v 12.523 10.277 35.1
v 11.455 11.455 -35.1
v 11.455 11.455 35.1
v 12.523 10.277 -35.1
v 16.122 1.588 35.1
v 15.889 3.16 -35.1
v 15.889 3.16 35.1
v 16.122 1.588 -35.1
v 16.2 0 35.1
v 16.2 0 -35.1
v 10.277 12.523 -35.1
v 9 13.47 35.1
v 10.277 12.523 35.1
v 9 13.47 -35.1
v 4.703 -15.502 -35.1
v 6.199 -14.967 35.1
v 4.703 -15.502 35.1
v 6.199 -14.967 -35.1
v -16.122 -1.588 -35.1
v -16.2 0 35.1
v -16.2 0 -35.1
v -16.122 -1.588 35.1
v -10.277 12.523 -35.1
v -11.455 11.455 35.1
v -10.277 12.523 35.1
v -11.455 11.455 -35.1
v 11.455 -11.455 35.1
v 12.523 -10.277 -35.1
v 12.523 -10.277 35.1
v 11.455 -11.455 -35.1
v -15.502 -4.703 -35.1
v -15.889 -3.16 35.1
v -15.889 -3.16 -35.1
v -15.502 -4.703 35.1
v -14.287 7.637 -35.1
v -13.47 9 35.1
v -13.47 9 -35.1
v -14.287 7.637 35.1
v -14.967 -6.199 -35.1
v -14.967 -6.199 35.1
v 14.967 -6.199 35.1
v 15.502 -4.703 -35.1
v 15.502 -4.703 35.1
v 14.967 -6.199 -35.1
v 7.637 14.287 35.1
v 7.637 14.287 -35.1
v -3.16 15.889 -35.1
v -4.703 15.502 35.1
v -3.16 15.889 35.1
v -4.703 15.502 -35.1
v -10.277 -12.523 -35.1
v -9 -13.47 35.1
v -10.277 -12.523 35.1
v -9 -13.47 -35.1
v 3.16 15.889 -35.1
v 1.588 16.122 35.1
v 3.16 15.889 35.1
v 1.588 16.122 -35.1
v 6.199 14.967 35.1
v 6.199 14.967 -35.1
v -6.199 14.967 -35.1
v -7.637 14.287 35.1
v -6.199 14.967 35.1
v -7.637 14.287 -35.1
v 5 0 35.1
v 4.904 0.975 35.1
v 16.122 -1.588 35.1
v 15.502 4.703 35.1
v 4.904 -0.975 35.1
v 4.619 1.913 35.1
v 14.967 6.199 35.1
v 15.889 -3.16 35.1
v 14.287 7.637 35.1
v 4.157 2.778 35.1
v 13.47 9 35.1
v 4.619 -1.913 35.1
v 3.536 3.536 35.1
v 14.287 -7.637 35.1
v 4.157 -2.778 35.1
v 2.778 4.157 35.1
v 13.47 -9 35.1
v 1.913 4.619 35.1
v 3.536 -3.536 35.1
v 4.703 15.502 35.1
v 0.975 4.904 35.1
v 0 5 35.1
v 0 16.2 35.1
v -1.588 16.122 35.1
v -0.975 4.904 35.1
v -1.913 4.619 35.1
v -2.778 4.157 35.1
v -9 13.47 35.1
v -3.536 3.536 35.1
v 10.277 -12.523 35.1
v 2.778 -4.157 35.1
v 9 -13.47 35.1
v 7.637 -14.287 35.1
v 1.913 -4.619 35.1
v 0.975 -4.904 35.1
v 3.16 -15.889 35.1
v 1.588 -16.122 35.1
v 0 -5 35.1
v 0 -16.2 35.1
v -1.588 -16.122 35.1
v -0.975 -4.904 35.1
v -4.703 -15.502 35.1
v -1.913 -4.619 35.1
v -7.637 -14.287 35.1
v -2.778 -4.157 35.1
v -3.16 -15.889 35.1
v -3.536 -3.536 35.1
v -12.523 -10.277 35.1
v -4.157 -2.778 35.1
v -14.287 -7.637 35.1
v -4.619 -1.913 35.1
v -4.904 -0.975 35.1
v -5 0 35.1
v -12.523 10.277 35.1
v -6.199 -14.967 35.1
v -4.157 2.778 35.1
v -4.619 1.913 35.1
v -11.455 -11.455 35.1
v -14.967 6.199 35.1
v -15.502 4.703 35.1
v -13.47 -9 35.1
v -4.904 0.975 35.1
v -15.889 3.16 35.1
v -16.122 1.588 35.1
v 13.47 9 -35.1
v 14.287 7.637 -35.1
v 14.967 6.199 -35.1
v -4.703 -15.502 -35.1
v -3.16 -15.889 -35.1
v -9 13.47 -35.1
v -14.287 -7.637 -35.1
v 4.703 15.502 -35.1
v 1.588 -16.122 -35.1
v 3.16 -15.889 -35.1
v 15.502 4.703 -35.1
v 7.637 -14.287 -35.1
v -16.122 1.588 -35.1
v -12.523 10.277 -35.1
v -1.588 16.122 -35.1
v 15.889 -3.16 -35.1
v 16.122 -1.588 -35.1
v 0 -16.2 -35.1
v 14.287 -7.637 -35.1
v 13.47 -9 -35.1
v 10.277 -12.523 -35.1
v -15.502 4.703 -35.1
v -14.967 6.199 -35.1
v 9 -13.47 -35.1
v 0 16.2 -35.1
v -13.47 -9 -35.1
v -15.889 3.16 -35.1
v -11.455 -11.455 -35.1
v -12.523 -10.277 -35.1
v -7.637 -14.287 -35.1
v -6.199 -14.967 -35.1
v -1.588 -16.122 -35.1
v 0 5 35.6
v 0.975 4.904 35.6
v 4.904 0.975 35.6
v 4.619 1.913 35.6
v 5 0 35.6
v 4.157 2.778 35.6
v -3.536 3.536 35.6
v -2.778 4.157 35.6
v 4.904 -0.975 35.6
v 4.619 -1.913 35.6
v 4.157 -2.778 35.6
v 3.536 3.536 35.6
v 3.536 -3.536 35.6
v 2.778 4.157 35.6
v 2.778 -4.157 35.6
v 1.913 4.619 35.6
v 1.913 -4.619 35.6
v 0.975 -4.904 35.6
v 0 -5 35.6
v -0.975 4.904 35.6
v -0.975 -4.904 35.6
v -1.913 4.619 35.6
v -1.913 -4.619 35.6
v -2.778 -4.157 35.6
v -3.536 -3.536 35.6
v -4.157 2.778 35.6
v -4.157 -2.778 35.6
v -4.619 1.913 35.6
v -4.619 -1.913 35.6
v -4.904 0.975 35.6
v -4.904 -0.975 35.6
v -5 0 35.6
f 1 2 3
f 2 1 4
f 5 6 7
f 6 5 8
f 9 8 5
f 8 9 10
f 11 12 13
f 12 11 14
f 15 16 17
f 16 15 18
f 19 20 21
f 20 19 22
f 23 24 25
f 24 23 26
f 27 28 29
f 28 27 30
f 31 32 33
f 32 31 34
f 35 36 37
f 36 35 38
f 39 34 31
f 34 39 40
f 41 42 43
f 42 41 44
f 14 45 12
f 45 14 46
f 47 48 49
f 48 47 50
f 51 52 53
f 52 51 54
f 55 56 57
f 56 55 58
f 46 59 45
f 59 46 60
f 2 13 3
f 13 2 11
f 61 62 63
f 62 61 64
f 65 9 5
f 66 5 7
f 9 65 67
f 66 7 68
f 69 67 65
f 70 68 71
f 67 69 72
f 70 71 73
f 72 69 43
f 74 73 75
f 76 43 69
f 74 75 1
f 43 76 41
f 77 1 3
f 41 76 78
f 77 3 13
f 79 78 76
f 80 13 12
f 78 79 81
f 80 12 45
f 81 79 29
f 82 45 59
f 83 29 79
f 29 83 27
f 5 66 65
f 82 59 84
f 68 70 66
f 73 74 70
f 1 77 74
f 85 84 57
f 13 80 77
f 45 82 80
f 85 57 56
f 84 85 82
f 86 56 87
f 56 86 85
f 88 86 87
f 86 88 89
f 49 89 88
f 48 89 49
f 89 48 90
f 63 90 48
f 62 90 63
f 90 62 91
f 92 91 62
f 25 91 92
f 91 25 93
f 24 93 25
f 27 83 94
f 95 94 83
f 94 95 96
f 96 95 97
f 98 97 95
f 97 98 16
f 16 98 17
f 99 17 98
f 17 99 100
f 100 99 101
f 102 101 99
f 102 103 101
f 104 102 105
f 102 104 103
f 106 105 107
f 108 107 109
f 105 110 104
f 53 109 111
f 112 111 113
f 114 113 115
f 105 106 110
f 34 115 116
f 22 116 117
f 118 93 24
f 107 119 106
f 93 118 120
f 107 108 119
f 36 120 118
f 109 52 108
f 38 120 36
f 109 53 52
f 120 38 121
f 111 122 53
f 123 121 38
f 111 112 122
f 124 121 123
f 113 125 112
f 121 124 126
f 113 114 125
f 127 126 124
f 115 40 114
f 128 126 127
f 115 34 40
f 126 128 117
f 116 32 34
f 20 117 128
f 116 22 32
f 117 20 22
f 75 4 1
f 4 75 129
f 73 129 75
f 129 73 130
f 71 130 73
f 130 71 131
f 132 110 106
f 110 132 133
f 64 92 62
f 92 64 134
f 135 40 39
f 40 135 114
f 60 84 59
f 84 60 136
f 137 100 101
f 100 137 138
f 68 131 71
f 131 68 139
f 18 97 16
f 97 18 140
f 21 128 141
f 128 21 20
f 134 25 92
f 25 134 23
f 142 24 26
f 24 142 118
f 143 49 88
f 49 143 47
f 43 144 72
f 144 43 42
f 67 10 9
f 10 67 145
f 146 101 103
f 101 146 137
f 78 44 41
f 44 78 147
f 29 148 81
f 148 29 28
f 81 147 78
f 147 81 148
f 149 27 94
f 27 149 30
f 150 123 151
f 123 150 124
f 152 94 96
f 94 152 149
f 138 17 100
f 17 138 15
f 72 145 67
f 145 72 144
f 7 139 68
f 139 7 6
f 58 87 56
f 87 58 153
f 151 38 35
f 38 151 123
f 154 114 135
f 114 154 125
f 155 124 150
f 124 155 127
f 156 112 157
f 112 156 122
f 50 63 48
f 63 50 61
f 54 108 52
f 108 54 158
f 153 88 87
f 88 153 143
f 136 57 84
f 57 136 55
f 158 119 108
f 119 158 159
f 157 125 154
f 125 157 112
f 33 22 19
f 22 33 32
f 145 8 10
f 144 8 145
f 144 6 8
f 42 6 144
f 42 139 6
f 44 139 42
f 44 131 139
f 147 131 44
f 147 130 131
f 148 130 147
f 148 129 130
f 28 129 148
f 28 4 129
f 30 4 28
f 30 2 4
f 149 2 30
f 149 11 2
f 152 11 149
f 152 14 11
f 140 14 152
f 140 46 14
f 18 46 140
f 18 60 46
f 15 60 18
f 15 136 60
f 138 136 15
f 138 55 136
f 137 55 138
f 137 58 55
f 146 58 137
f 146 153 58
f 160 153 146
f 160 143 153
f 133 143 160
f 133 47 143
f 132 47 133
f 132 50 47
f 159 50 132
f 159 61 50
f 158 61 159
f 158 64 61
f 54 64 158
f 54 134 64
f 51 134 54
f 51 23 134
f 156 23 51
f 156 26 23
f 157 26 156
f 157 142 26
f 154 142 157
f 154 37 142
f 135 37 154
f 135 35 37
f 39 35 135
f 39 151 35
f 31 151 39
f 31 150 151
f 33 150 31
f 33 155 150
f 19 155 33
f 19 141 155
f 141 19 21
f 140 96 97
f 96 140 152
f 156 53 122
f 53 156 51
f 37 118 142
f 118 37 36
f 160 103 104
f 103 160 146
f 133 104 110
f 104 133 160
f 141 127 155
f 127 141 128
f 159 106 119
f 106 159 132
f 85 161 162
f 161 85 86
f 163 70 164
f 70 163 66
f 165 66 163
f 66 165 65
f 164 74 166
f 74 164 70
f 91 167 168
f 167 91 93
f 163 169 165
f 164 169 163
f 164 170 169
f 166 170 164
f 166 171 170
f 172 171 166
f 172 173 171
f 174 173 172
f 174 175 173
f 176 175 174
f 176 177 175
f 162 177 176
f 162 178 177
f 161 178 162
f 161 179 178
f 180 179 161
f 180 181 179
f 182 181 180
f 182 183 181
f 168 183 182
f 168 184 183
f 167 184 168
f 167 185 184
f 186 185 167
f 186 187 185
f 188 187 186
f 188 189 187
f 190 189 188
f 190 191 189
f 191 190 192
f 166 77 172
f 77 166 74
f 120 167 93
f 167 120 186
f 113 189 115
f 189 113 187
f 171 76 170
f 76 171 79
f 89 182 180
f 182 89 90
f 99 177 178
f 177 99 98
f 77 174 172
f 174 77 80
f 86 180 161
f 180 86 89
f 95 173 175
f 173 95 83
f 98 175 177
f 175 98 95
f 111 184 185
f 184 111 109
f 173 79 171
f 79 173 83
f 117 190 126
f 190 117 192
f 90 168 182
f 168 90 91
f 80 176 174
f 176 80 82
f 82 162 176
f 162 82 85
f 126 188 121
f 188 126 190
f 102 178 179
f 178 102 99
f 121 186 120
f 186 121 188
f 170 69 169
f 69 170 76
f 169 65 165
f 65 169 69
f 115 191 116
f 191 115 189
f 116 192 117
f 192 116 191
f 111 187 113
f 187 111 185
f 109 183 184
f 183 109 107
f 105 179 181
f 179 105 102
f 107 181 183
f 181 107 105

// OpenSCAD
// Parameters
height_mm = 70.2; //[35.1:140.4:0.1]
diameter_mm = 32.4; //[16.2:64.8:0.1]
positive_terminal_height_mm = 1.5; //[0.75:3:0.1]
positive_terminal_diameter_mm = 10; //[5:20:0.1]
negative_terminal_height_mm = 0.5; //[0.25:1:0.05]
negative_terminal_diameter_mm = 12; //[6:24:0.1]
terminal_overlap_mm = 1; //[0.5:2:0.1]

// Battery - complete geometry
module battery() {
  color("DimGray") {
    // Cylindrical cell body
    cylinder(h=height_mm, r=diameter_mm/2, center=true, $fn=64);
    
    // Positive terminal button
    translate([0, 0, height_mm/2 + positive_terminal_height_mm/2 - terminal_overlap_mm])
      cylinder(h=positive_terminal_height_mm, r=positive_terminal_diameter_mm/2, center=true, $fn=32);
    
    // Negative terminal contact
    translate([0, 0, -height_mm/2 - negative_terminal_height_mm/2 + terminal_overlap_mm])
      cylinder(h=negative_terminal_height_mm, r=negative_terminal_diameter_mm/2, center=true, $fn=32);
  }
}

// Assembly
module assembly() {
  battery();
}

assembly();
